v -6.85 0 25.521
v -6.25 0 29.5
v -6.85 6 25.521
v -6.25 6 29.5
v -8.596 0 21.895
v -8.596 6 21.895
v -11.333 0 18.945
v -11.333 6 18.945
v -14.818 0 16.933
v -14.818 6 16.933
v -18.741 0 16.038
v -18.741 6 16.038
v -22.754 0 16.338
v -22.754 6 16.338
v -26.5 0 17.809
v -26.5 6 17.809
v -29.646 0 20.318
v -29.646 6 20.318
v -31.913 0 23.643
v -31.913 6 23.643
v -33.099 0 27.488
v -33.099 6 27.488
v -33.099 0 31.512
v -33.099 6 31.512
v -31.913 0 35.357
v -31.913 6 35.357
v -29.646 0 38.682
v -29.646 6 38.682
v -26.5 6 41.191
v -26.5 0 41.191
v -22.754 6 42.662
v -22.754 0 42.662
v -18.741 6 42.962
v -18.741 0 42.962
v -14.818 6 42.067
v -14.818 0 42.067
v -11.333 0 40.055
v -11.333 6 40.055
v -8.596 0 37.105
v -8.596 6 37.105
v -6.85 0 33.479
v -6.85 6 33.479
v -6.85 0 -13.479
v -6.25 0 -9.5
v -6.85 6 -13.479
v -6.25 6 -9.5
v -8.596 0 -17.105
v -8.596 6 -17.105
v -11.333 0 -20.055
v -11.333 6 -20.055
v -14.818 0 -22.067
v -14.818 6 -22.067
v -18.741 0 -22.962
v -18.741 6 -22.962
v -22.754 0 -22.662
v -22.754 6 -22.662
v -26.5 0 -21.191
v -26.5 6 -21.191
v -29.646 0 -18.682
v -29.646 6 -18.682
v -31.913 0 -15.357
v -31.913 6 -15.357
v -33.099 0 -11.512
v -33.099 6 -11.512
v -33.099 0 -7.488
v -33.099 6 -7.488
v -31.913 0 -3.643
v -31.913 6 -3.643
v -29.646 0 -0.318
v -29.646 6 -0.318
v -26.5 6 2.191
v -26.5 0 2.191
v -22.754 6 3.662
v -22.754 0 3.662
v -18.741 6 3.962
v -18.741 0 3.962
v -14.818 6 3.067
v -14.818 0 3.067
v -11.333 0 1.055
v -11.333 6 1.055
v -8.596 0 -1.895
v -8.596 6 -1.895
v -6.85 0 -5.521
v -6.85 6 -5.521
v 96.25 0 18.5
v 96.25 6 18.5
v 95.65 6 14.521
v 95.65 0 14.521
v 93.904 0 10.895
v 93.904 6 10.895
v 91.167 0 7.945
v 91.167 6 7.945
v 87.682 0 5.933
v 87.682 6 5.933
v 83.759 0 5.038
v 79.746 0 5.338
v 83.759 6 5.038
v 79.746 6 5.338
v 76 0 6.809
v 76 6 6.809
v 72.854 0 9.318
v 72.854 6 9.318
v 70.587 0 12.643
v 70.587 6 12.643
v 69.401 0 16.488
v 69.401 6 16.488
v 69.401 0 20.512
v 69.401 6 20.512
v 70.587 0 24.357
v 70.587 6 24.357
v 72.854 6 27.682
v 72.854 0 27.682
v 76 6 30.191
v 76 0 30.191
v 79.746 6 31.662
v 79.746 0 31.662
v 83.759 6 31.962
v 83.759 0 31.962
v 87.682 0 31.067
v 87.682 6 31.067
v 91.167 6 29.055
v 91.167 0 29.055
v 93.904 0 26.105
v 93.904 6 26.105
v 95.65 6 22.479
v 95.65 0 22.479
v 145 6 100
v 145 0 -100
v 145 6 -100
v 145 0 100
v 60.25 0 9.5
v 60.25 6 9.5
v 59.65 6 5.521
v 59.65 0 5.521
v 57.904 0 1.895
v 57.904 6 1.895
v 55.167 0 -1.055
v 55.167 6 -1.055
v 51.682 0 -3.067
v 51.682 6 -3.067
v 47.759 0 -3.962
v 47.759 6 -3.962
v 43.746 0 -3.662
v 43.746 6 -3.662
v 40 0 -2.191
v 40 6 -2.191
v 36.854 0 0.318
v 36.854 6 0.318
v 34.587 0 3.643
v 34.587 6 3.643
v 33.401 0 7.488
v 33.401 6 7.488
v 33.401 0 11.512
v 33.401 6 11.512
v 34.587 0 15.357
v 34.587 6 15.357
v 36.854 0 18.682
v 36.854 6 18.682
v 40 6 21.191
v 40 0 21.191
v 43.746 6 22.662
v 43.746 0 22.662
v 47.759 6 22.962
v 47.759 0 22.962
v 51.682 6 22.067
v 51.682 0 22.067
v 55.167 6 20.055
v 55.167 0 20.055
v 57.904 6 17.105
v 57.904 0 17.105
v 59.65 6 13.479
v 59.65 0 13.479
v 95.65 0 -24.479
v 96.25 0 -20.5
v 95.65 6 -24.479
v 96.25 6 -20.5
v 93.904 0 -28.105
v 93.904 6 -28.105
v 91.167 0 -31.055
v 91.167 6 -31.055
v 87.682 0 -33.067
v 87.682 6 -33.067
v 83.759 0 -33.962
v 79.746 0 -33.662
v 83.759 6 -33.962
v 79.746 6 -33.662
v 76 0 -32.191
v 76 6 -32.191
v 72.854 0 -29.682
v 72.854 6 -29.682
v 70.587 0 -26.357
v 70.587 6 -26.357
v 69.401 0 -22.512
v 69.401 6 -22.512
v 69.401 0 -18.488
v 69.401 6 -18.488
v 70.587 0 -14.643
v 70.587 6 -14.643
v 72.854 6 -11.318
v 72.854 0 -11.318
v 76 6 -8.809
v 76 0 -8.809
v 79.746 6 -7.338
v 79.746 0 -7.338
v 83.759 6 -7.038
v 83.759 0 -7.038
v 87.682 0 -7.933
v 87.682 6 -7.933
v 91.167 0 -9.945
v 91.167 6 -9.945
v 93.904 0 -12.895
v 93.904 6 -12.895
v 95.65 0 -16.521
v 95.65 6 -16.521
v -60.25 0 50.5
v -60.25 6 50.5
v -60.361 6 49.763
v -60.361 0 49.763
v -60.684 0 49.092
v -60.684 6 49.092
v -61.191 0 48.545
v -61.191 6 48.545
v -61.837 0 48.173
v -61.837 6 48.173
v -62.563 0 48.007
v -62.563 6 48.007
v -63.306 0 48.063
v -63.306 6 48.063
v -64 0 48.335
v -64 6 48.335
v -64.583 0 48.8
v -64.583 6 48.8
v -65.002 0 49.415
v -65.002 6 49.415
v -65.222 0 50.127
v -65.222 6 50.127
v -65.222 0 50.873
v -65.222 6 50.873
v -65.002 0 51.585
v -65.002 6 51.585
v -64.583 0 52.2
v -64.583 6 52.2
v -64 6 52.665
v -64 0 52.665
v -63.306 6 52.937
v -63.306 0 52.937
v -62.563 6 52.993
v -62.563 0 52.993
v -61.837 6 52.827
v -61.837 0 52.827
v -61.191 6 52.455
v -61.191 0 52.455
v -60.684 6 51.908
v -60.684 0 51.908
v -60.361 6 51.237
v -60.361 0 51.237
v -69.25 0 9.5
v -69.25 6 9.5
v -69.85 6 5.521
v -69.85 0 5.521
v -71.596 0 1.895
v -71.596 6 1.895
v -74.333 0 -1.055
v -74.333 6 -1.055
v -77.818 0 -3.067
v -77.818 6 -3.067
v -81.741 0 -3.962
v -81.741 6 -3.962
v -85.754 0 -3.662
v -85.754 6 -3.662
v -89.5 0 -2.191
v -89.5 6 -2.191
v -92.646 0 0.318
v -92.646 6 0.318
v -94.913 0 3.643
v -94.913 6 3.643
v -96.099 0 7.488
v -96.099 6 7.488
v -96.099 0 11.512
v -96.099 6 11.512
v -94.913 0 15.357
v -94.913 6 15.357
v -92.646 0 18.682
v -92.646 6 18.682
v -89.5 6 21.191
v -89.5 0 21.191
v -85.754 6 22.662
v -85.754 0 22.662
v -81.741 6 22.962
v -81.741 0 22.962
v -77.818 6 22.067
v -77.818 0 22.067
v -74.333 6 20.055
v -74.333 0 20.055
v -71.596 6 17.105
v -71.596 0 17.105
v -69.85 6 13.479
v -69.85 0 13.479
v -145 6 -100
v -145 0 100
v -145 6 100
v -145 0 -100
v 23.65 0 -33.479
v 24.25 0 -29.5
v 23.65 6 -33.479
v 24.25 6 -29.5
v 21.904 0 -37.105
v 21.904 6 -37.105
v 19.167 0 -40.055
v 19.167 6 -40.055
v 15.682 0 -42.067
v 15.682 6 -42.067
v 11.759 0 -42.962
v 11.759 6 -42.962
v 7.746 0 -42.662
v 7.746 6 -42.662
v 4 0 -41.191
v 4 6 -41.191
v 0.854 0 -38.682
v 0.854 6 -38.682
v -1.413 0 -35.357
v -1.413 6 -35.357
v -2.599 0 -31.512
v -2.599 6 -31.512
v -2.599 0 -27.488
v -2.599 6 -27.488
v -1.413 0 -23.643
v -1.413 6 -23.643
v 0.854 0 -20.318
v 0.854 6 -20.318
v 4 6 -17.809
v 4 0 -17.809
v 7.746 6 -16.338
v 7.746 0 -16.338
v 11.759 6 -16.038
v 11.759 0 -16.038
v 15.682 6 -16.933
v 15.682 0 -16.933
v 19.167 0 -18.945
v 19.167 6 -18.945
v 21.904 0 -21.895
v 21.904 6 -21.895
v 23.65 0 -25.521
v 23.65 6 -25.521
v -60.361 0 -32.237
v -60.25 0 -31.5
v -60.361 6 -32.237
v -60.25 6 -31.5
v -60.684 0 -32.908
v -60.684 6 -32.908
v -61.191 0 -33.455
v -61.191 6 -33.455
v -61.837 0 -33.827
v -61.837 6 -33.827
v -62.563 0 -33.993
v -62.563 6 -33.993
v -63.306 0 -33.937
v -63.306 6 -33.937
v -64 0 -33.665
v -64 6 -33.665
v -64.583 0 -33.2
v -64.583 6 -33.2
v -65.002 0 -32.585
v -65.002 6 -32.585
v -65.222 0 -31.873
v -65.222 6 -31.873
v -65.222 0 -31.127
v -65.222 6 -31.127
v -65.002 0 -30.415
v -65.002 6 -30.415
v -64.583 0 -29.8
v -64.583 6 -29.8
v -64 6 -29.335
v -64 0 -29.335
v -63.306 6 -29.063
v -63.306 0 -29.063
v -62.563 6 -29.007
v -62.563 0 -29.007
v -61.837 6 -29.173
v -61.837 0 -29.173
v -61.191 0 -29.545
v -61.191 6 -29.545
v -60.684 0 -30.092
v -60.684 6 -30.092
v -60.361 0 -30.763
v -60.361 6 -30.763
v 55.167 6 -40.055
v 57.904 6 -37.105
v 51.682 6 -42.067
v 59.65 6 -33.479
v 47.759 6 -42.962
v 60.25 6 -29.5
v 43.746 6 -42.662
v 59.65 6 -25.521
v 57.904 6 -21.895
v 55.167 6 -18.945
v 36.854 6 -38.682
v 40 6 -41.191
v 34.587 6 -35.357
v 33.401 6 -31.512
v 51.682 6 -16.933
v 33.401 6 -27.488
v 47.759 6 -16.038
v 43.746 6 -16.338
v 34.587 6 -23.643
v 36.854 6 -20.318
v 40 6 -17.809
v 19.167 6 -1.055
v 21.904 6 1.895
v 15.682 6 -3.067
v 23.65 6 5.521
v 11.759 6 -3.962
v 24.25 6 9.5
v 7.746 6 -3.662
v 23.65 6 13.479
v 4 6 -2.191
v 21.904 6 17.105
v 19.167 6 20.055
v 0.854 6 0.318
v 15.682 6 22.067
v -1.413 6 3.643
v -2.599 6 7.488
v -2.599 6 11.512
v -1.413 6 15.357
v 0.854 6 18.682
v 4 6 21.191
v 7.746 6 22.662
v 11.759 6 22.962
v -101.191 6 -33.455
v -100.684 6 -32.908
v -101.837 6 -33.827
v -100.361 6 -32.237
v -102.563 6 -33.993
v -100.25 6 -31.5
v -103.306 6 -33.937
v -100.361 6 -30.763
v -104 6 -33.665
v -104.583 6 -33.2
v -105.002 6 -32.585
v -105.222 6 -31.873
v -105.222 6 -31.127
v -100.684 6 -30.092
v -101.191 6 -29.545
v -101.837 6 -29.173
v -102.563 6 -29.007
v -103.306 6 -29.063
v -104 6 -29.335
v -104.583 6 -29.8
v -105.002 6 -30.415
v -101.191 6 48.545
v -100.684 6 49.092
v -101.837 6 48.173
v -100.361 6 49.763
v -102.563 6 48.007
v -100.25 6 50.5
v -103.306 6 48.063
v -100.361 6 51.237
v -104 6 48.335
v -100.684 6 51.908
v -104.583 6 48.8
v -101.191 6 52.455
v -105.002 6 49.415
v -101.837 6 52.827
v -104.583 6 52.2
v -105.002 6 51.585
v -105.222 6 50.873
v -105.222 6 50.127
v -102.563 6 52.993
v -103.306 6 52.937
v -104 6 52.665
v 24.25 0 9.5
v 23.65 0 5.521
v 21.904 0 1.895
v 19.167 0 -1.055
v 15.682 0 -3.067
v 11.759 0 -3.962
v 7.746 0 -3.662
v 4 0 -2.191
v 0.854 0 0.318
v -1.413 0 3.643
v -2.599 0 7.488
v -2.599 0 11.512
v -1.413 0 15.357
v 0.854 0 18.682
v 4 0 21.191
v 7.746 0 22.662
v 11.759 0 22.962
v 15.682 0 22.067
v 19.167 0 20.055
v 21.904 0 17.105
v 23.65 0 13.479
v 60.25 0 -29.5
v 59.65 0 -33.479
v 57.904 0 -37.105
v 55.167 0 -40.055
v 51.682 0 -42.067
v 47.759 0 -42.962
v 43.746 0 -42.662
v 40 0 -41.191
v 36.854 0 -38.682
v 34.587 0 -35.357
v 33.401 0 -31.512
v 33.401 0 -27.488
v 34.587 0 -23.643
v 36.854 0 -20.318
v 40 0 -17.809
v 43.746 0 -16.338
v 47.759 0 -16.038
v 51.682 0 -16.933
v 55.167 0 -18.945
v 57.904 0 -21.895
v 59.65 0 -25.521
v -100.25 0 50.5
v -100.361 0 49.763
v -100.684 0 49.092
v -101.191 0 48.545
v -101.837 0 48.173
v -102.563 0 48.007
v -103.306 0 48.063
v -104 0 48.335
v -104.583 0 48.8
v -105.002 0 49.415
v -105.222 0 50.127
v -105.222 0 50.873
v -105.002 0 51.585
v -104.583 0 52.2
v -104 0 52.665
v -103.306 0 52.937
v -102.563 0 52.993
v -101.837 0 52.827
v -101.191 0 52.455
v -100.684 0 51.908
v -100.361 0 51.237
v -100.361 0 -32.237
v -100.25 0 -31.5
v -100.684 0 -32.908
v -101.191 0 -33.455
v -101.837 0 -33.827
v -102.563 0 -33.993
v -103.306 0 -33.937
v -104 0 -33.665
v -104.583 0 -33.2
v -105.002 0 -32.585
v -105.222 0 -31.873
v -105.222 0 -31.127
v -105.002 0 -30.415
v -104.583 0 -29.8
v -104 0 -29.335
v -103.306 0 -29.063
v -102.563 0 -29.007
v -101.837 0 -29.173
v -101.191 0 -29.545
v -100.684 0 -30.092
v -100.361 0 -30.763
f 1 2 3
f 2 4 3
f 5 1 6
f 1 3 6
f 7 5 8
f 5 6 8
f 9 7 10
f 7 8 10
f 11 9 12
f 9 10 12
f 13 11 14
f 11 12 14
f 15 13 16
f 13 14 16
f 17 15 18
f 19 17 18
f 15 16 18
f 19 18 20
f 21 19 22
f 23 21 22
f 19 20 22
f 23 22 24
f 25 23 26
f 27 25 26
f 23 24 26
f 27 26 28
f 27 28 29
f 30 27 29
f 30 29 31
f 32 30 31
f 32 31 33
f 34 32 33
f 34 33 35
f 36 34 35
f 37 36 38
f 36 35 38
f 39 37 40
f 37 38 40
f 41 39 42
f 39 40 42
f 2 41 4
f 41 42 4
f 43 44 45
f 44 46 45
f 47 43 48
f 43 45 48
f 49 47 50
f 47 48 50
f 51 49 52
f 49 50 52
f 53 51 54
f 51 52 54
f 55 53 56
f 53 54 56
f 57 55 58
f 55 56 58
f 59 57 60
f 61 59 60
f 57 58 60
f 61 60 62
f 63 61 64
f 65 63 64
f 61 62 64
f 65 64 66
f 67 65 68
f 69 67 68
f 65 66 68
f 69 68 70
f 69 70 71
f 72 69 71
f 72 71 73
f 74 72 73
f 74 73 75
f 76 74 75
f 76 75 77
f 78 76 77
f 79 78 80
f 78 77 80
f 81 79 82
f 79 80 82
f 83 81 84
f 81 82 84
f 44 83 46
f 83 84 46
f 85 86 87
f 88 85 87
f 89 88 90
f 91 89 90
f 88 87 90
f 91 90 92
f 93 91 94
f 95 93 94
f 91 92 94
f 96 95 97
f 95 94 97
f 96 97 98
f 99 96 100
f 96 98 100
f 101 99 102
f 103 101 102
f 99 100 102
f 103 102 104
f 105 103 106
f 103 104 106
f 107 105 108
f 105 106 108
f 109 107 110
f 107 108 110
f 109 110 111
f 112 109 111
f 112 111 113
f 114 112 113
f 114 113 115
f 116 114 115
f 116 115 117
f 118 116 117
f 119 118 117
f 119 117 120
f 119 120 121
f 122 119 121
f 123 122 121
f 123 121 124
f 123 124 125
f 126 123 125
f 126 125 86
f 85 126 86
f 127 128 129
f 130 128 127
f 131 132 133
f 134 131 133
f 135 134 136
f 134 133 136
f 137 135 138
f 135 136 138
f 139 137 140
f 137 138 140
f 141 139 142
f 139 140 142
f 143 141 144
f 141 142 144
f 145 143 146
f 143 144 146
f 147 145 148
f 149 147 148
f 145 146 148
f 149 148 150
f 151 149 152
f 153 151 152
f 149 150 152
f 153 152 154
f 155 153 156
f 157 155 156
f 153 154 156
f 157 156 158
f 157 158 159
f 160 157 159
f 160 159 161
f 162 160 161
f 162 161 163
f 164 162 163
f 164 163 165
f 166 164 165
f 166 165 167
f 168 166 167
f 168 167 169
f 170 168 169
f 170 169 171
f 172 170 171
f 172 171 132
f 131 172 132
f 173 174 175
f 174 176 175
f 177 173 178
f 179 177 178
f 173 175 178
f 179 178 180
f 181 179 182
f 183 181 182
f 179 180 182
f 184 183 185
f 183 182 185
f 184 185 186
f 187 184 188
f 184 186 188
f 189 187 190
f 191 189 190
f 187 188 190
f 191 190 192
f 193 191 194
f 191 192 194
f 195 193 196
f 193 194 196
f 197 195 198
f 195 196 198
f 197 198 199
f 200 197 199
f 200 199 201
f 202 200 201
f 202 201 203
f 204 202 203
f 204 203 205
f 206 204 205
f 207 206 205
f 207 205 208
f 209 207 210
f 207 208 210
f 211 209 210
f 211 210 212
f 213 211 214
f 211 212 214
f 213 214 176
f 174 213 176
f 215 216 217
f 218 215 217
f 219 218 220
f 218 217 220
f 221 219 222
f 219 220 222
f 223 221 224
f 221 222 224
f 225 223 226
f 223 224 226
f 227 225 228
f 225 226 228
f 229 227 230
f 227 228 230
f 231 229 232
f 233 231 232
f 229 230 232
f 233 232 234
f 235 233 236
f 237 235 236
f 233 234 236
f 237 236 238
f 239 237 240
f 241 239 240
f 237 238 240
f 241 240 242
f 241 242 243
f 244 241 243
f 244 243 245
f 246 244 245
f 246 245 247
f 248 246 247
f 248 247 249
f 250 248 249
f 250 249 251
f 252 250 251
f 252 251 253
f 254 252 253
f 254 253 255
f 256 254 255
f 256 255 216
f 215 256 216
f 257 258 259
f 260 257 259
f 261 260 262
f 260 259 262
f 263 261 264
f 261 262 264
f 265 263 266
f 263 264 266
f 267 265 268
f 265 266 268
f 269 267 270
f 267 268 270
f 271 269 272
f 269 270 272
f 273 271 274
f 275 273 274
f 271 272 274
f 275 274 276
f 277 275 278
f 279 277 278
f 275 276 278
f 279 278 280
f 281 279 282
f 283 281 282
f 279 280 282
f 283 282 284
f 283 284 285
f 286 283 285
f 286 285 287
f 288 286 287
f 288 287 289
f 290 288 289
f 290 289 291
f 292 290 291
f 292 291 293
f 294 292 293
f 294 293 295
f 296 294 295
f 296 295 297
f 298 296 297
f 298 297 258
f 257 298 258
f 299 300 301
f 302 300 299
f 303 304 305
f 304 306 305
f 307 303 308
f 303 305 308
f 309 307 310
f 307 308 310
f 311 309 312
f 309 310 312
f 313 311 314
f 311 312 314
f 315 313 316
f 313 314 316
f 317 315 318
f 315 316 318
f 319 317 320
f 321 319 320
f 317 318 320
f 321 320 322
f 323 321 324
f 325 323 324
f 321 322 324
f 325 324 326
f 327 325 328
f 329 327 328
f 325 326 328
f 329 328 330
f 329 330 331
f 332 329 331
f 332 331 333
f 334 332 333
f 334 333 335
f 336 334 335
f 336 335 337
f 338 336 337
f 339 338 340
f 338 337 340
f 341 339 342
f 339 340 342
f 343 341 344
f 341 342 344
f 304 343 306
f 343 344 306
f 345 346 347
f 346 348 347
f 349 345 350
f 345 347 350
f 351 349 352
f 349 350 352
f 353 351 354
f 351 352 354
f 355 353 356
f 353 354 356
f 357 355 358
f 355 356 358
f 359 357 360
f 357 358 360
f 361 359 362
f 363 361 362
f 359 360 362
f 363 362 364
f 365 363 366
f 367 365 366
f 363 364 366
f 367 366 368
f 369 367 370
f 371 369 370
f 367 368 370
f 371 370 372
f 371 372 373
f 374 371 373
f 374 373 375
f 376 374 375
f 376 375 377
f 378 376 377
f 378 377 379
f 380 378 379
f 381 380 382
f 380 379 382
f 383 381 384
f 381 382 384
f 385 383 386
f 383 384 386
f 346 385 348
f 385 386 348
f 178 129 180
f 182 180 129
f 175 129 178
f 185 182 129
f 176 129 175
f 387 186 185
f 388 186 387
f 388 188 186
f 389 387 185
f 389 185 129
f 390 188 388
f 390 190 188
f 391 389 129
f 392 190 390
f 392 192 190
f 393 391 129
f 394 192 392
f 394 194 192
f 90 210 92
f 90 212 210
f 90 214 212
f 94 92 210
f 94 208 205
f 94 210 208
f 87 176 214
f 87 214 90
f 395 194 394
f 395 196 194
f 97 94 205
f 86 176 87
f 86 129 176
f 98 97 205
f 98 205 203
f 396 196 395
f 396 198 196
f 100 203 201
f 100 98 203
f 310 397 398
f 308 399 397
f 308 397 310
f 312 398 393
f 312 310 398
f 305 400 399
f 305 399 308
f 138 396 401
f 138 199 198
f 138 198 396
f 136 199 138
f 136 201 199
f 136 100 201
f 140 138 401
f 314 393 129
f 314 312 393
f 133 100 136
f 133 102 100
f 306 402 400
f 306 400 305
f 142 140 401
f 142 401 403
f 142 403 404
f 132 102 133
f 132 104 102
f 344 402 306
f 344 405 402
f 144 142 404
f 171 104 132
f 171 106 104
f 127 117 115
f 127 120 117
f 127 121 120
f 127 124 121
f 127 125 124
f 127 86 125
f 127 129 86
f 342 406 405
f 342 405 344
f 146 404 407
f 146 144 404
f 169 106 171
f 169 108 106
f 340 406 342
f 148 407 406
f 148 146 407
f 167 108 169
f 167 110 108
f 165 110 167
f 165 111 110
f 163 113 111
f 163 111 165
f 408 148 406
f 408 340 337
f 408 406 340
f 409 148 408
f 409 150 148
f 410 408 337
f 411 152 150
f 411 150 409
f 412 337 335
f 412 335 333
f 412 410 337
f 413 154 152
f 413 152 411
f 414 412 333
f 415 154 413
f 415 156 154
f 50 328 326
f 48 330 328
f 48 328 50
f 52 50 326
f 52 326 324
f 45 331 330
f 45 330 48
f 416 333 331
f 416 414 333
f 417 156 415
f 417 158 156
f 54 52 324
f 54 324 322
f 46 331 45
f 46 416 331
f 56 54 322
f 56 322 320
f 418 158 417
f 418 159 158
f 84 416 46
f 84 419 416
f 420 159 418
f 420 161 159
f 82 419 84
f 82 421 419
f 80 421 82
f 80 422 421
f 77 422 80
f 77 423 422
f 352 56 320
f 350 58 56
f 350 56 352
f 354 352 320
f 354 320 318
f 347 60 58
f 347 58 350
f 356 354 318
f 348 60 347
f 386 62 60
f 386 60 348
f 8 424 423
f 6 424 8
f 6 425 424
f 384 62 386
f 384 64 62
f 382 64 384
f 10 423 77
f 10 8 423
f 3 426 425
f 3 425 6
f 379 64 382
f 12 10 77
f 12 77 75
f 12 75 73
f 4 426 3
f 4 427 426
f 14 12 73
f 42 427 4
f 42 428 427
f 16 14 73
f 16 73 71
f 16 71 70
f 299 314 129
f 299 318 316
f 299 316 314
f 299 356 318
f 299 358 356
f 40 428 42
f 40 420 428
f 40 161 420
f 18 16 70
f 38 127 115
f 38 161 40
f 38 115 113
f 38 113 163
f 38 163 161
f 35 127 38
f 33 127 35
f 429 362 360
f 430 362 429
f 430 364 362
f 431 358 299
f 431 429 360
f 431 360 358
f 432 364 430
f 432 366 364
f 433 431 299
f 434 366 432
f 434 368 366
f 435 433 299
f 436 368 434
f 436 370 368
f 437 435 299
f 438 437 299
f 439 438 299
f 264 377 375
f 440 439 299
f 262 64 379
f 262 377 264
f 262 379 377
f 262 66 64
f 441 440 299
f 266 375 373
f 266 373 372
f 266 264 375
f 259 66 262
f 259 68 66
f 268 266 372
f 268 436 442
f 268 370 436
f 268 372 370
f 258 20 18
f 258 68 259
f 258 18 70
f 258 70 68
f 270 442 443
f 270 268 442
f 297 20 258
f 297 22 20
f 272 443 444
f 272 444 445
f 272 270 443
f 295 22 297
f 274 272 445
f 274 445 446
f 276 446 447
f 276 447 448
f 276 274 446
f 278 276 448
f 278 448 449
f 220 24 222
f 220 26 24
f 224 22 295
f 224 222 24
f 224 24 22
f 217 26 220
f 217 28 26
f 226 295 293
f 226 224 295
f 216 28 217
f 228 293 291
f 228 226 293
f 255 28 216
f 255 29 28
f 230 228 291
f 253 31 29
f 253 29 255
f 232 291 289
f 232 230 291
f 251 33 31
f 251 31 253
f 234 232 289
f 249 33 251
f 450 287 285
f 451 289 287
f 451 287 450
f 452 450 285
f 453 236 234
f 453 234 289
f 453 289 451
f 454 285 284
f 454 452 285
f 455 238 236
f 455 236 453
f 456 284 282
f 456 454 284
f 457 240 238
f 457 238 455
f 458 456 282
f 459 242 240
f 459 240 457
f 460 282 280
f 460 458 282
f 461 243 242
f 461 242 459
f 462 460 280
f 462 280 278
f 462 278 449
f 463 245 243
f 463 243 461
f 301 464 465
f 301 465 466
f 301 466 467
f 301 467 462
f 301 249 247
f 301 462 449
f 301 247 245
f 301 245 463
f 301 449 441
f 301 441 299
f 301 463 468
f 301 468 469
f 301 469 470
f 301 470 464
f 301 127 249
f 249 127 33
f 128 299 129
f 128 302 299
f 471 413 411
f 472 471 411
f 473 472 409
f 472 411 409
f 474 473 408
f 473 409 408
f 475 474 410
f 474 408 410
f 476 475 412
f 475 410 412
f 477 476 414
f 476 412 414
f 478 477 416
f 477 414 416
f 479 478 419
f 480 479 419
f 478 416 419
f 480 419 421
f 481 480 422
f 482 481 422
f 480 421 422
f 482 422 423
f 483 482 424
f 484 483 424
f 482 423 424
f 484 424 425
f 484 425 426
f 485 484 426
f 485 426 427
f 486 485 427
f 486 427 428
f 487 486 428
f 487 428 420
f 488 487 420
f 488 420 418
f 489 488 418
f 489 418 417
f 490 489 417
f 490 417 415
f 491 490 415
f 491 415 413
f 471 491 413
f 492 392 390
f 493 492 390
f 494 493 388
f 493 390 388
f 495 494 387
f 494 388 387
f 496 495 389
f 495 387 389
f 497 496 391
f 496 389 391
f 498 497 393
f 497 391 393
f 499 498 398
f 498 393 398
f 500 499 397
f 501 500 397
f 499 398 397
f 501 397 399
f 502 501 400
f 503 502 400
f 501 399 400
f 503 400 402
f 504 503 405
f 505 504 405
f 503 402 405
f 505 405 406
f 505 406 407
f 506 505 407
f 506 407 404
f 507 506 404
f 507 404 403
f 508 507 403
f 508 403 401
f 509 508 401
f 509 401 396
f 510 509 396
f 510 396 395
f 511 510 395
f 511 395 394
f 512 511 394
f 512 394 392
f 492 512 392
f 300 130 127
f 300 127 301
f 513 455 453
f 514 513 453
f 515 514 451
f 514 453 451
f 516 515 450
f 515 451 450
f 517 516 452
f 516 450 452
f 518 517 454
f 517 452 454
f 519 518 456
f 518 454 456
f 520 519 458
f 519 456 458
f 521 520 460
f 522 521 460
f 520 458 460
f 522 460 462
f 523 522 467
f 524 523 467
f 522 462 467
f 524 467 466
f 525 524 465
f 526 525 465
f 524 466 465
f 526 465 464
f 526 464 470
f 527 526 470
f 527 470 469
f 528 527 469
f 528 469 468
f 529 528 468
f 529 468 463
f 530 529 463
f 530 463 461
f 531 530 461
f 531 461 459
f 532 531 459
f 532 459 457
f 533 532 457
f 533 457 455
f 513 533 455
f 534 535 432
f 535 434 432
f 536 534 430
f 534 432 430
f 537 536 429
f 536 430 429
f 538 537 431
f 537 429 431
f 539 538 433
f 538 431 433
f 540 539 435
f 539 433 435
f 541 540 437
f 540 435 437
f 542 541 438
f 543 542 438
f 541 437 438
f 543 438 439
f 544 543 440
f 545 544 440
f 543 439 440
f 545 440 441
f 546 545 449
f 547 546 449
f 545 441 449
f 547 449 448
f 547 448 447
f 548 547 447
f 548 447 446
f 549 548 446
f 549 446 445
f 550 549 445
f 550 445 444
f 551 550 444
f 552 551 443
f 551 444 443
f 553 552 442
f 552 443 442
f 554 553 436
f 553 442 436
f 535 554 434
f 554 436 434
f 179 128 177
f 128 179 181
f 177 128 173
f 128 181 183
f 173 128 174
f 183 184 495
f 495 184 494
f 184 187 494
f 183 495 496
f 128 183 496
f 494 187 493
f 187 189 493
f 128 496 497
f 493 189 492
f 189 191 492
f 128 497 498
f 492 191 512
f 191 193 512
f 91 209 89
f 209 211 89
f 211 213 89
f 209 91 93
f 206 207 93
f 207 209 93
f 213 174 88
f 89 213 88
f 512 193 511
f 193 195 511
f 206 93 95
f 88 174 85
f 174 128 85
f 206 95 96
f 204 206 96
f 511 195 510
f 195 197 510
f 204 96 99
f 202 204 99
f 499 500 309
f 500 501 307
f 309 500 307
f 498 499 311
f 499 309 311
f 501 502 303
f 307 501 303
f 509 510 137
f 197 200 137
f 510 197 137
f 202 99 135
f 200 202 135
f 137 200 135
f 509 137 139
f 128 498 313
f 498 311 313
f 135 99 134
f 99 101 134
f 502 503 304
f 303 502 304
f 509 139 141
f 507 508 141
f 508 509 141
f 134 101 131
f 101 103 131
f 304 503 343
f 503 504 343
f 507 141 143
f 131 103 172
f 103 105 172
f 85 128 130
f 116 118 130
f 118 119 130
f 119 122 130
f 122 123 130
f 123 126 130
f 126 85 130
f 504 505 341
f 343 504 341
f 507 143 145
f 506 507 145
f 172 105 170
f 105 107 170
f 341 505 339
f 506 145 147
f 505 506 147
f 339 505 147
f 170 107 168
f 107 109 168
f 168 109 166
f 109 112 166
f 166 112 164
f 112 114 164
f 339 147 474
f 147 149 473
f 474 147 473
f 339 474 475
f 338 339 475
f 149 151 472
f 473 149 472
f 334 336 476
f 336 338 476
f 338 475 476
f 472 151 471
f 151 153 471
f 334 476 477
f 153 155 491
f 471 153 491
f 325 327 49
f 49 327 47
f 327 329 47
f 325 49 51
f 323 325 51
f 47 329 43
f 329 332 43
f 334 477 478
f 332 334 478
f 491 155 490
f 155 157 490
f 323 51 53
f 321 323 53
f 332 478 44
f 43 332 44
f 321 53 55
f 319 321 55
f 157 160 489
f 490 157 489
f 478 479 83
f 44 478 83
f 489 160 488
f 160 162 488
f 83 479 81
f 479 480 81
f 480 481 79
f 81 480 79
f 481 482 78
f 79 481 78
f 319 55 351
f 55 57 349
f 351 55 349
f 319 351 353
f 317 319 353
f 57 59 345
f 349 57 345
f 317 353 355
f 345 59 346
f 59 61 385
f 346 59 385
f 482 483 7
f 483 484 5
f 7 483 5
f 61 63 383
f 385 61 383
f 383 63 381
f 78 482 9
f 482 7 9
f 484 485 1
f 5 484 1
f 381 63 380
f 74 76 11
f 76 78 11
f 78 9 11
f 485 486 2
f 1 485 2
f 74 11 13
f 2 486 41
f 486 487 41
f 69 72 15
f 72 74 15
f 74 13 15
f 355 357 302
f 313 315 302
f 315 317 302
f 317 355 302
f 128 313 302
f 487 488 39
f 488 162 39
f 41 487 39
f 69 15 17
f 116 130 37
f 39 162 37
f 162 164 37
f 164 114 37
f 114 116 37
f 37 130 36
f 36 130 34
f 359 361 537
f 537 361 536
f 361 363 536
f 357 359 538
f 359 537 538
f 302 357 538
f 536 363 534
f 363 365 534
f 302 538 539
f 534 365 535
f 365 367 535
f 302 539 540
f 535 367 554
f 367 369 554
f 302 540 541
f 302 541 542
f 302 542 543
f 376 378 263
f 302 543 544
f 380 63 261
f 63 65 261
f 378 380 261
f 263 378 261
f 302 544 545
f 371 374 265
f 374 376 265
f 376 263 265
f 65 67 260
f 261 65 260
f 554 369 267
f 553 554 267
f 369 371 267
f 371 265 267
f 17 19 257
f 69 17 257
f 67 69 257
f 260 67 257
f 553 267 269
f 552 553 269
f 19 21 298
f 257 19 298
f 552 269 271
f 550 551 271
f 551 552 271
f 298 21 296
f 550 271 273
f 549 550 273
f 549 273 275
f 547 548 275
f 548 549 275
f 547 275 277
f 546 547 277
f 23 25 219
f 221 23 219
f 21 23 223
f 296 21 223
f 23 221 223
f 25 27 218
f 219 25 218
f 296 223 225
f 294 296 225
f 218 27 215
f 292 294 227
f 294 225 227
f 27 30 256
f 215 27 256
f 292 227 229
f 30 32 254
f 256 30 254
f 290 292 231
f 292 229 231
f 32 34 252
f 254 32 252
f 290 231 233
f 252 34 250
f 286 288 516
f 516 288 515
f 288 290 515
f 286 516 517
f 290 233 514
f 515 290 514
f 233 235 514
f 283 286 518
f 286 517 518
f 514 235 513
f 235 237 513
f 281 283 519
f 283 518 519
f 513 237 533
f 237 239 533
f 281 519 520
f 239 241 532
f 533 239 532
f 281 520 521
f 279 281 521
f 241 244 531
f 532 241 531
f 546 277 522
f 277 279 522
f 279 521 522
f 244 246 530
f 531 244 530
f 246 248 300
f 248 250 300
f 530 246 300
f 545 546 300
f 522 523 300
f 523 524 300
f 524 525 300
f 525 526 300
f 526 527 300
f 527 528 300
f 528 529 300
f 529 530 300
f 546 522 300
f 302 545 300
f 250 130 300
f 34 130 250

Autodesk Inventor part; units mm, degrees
ref_plane "YZ Plane" through (0, 0, 0) normal (1, 0, 0) x (0, 1, 0)
ref_plane "XZ Plane" through (0, 0, 0) normal (0, 1, 0) x (-1, 0, 0)
ref_plane "XY Plane" through (0, 0, 0) normal (0, 0, 1) x (1, 0, 0)
sketch "Sketch1" plane through (0, 0, 0) normal (0, 1, 0) x (-1, 0, 0)
  line L0 (145, -100) -> (-145, -100)
  line L1 (-145, -100) -> (-145, 100)
  line L2 (-145, 100) -> (145, 100)
  line L3 (145, 100) -> (145, -100)
  line L4 (210, 0) -> (-210, 0) projected
  line L5 (0, -140) -> (0, 140) projected
  point P0 (0, 0)
  dimension "d30" = 290
  dimension "d31" = 200
extrude "Extrusion1" add sketch "Sketch1" along normal blind 6
sketch "Sketch2" plane through (0, 6, 0) normal (0, 1, 0) x (1, 0, 0)
  circle A0 centre (-19.75, -29.5) radius 13.5
  circle A1 centre (-82.75, -9.5) radius 13.5
  circle A2 centre (-19.75, 9.5) radius 13.5
  circle A3 centre (46.75, 29.5) radius 13.5
  circle A4 centre (82.75, 20.5) radius 13.5
  circle A5 centre (10.75, 29.5) radius 13.5
  circle A6 centre (10.75, -9.5) radius 13.5
  circle A7 centre (46.75, -9.5) radius 13.5
  circle A8 centre (82.75, -18.5) radius 13.5
  line L0 (-96.25, 43) -> (96.25, 43)
  line L1 (96.25, 43) -> (96.25, -43)
  line L2 (96.25, -43) -> (-96.25, -43)
  line L3 (-96.25, -43) -> (-96.25, 43)
  line L4 (145, 100) -> (-145, 100) projected
  line L5 (145, -100) -> (145, 100) projected
  line L6 (0, 140) -> (0, -140) projected
  line L7 (-210, 0) -> (210, 0) projected
  line L8 (-102.75, 31.5) -> (-62.75, 31.5)
  line L9 (-62.75, 31.5) -> (-62.75, -50.5)
  line L10 (-62.75, -50.5) -> (-102.75, -50.5)
  line L11 (-102.75, -50.5) -> (-102.75, 31.5)
  circle A9 centre (-102.75, 31.5) radius 2.5
  circle A10 centre (-62.75, 31.5) radius 2.5
  circle A11 centre (-102.75, -50.5) radius 2.5
  circle A12 centre (-62.75, -50.5) radius 2.5
  dimension "d3" = 27
  dimension "d19" = 30.5
  dimension "d20" = 36
  dimension "d23" = 19
  dimension "d24" = 9
  dimension "d25" = 36
  dimension "d26" = 11
  dimension "d27" = 9
  dimension "d28" = 11
  dimension "d29" = 63
  dimension "d35" = 41
  dimension "d36" = 41
  dimension "d37" = 20
  dimension "d38" = 20
  dimension "d39" = 5
  dimension "d40" = 5
  dimension "d41" = 5
  dimension "d42" = 5
extrude "Extrusion2" cut sketch "Sketch2" against normal blind 30 contours A0 | A8 | L6 A6 L7 | A6 L6 | A12 L10 L9 | L9 L10 A12 | A1 L7 | L7 A1 | L7 A2 | A2 L7 | A10 L8 L9 | L9 L8 A10 | A4 | A3 | A6 L7 | A11 L11 L10 | L10 L11 A11 | L7 A7 | A7 L7 | L6 A5 | A5 L6 | A9 L11 L8 | L8 L11 A9 picked at (6.7806, -6.3333)
equation "\"d30\" = BoxLength"
equation "\"d31\" = BoxWidth"
equation "\"d3\" = JS_Hole_dia"
equation "\"d36\" = 0.5 * JS_SH_L"
equation "\"d37\" = 0.5 * JS_SH_W"
equation "\"d38\" = 0.5 * JS_SH_W"
equation "\"d39\" = JS_SH_dia"
equation "\"d40\" = JS_SH_dia"
equation "\"d41\" = JS_SH_dia"
equation "\"d42\" = JS_SH_dia"
equation "\"BoxLength\" = 290"
equation "\"BoxWidth\" = 200"
equation "\"JS_SH_L\" = 82"
equation "\"JS_SH_dia\" = 5"
equation "\"SheetThickness\" = 6"
equation "\"CornerOffset\" = 5"
equation "\"NutS\" = 5.7"
equation "\"NutThreadD2\" = 4.17"
equation "\"SideNutWidth\" = 2.5"
equation "\"JS_Hole_dia\" = 27"
equation "\"JS_SH_W\" = 40"
properties part number "sega_straight_b1_v1"
